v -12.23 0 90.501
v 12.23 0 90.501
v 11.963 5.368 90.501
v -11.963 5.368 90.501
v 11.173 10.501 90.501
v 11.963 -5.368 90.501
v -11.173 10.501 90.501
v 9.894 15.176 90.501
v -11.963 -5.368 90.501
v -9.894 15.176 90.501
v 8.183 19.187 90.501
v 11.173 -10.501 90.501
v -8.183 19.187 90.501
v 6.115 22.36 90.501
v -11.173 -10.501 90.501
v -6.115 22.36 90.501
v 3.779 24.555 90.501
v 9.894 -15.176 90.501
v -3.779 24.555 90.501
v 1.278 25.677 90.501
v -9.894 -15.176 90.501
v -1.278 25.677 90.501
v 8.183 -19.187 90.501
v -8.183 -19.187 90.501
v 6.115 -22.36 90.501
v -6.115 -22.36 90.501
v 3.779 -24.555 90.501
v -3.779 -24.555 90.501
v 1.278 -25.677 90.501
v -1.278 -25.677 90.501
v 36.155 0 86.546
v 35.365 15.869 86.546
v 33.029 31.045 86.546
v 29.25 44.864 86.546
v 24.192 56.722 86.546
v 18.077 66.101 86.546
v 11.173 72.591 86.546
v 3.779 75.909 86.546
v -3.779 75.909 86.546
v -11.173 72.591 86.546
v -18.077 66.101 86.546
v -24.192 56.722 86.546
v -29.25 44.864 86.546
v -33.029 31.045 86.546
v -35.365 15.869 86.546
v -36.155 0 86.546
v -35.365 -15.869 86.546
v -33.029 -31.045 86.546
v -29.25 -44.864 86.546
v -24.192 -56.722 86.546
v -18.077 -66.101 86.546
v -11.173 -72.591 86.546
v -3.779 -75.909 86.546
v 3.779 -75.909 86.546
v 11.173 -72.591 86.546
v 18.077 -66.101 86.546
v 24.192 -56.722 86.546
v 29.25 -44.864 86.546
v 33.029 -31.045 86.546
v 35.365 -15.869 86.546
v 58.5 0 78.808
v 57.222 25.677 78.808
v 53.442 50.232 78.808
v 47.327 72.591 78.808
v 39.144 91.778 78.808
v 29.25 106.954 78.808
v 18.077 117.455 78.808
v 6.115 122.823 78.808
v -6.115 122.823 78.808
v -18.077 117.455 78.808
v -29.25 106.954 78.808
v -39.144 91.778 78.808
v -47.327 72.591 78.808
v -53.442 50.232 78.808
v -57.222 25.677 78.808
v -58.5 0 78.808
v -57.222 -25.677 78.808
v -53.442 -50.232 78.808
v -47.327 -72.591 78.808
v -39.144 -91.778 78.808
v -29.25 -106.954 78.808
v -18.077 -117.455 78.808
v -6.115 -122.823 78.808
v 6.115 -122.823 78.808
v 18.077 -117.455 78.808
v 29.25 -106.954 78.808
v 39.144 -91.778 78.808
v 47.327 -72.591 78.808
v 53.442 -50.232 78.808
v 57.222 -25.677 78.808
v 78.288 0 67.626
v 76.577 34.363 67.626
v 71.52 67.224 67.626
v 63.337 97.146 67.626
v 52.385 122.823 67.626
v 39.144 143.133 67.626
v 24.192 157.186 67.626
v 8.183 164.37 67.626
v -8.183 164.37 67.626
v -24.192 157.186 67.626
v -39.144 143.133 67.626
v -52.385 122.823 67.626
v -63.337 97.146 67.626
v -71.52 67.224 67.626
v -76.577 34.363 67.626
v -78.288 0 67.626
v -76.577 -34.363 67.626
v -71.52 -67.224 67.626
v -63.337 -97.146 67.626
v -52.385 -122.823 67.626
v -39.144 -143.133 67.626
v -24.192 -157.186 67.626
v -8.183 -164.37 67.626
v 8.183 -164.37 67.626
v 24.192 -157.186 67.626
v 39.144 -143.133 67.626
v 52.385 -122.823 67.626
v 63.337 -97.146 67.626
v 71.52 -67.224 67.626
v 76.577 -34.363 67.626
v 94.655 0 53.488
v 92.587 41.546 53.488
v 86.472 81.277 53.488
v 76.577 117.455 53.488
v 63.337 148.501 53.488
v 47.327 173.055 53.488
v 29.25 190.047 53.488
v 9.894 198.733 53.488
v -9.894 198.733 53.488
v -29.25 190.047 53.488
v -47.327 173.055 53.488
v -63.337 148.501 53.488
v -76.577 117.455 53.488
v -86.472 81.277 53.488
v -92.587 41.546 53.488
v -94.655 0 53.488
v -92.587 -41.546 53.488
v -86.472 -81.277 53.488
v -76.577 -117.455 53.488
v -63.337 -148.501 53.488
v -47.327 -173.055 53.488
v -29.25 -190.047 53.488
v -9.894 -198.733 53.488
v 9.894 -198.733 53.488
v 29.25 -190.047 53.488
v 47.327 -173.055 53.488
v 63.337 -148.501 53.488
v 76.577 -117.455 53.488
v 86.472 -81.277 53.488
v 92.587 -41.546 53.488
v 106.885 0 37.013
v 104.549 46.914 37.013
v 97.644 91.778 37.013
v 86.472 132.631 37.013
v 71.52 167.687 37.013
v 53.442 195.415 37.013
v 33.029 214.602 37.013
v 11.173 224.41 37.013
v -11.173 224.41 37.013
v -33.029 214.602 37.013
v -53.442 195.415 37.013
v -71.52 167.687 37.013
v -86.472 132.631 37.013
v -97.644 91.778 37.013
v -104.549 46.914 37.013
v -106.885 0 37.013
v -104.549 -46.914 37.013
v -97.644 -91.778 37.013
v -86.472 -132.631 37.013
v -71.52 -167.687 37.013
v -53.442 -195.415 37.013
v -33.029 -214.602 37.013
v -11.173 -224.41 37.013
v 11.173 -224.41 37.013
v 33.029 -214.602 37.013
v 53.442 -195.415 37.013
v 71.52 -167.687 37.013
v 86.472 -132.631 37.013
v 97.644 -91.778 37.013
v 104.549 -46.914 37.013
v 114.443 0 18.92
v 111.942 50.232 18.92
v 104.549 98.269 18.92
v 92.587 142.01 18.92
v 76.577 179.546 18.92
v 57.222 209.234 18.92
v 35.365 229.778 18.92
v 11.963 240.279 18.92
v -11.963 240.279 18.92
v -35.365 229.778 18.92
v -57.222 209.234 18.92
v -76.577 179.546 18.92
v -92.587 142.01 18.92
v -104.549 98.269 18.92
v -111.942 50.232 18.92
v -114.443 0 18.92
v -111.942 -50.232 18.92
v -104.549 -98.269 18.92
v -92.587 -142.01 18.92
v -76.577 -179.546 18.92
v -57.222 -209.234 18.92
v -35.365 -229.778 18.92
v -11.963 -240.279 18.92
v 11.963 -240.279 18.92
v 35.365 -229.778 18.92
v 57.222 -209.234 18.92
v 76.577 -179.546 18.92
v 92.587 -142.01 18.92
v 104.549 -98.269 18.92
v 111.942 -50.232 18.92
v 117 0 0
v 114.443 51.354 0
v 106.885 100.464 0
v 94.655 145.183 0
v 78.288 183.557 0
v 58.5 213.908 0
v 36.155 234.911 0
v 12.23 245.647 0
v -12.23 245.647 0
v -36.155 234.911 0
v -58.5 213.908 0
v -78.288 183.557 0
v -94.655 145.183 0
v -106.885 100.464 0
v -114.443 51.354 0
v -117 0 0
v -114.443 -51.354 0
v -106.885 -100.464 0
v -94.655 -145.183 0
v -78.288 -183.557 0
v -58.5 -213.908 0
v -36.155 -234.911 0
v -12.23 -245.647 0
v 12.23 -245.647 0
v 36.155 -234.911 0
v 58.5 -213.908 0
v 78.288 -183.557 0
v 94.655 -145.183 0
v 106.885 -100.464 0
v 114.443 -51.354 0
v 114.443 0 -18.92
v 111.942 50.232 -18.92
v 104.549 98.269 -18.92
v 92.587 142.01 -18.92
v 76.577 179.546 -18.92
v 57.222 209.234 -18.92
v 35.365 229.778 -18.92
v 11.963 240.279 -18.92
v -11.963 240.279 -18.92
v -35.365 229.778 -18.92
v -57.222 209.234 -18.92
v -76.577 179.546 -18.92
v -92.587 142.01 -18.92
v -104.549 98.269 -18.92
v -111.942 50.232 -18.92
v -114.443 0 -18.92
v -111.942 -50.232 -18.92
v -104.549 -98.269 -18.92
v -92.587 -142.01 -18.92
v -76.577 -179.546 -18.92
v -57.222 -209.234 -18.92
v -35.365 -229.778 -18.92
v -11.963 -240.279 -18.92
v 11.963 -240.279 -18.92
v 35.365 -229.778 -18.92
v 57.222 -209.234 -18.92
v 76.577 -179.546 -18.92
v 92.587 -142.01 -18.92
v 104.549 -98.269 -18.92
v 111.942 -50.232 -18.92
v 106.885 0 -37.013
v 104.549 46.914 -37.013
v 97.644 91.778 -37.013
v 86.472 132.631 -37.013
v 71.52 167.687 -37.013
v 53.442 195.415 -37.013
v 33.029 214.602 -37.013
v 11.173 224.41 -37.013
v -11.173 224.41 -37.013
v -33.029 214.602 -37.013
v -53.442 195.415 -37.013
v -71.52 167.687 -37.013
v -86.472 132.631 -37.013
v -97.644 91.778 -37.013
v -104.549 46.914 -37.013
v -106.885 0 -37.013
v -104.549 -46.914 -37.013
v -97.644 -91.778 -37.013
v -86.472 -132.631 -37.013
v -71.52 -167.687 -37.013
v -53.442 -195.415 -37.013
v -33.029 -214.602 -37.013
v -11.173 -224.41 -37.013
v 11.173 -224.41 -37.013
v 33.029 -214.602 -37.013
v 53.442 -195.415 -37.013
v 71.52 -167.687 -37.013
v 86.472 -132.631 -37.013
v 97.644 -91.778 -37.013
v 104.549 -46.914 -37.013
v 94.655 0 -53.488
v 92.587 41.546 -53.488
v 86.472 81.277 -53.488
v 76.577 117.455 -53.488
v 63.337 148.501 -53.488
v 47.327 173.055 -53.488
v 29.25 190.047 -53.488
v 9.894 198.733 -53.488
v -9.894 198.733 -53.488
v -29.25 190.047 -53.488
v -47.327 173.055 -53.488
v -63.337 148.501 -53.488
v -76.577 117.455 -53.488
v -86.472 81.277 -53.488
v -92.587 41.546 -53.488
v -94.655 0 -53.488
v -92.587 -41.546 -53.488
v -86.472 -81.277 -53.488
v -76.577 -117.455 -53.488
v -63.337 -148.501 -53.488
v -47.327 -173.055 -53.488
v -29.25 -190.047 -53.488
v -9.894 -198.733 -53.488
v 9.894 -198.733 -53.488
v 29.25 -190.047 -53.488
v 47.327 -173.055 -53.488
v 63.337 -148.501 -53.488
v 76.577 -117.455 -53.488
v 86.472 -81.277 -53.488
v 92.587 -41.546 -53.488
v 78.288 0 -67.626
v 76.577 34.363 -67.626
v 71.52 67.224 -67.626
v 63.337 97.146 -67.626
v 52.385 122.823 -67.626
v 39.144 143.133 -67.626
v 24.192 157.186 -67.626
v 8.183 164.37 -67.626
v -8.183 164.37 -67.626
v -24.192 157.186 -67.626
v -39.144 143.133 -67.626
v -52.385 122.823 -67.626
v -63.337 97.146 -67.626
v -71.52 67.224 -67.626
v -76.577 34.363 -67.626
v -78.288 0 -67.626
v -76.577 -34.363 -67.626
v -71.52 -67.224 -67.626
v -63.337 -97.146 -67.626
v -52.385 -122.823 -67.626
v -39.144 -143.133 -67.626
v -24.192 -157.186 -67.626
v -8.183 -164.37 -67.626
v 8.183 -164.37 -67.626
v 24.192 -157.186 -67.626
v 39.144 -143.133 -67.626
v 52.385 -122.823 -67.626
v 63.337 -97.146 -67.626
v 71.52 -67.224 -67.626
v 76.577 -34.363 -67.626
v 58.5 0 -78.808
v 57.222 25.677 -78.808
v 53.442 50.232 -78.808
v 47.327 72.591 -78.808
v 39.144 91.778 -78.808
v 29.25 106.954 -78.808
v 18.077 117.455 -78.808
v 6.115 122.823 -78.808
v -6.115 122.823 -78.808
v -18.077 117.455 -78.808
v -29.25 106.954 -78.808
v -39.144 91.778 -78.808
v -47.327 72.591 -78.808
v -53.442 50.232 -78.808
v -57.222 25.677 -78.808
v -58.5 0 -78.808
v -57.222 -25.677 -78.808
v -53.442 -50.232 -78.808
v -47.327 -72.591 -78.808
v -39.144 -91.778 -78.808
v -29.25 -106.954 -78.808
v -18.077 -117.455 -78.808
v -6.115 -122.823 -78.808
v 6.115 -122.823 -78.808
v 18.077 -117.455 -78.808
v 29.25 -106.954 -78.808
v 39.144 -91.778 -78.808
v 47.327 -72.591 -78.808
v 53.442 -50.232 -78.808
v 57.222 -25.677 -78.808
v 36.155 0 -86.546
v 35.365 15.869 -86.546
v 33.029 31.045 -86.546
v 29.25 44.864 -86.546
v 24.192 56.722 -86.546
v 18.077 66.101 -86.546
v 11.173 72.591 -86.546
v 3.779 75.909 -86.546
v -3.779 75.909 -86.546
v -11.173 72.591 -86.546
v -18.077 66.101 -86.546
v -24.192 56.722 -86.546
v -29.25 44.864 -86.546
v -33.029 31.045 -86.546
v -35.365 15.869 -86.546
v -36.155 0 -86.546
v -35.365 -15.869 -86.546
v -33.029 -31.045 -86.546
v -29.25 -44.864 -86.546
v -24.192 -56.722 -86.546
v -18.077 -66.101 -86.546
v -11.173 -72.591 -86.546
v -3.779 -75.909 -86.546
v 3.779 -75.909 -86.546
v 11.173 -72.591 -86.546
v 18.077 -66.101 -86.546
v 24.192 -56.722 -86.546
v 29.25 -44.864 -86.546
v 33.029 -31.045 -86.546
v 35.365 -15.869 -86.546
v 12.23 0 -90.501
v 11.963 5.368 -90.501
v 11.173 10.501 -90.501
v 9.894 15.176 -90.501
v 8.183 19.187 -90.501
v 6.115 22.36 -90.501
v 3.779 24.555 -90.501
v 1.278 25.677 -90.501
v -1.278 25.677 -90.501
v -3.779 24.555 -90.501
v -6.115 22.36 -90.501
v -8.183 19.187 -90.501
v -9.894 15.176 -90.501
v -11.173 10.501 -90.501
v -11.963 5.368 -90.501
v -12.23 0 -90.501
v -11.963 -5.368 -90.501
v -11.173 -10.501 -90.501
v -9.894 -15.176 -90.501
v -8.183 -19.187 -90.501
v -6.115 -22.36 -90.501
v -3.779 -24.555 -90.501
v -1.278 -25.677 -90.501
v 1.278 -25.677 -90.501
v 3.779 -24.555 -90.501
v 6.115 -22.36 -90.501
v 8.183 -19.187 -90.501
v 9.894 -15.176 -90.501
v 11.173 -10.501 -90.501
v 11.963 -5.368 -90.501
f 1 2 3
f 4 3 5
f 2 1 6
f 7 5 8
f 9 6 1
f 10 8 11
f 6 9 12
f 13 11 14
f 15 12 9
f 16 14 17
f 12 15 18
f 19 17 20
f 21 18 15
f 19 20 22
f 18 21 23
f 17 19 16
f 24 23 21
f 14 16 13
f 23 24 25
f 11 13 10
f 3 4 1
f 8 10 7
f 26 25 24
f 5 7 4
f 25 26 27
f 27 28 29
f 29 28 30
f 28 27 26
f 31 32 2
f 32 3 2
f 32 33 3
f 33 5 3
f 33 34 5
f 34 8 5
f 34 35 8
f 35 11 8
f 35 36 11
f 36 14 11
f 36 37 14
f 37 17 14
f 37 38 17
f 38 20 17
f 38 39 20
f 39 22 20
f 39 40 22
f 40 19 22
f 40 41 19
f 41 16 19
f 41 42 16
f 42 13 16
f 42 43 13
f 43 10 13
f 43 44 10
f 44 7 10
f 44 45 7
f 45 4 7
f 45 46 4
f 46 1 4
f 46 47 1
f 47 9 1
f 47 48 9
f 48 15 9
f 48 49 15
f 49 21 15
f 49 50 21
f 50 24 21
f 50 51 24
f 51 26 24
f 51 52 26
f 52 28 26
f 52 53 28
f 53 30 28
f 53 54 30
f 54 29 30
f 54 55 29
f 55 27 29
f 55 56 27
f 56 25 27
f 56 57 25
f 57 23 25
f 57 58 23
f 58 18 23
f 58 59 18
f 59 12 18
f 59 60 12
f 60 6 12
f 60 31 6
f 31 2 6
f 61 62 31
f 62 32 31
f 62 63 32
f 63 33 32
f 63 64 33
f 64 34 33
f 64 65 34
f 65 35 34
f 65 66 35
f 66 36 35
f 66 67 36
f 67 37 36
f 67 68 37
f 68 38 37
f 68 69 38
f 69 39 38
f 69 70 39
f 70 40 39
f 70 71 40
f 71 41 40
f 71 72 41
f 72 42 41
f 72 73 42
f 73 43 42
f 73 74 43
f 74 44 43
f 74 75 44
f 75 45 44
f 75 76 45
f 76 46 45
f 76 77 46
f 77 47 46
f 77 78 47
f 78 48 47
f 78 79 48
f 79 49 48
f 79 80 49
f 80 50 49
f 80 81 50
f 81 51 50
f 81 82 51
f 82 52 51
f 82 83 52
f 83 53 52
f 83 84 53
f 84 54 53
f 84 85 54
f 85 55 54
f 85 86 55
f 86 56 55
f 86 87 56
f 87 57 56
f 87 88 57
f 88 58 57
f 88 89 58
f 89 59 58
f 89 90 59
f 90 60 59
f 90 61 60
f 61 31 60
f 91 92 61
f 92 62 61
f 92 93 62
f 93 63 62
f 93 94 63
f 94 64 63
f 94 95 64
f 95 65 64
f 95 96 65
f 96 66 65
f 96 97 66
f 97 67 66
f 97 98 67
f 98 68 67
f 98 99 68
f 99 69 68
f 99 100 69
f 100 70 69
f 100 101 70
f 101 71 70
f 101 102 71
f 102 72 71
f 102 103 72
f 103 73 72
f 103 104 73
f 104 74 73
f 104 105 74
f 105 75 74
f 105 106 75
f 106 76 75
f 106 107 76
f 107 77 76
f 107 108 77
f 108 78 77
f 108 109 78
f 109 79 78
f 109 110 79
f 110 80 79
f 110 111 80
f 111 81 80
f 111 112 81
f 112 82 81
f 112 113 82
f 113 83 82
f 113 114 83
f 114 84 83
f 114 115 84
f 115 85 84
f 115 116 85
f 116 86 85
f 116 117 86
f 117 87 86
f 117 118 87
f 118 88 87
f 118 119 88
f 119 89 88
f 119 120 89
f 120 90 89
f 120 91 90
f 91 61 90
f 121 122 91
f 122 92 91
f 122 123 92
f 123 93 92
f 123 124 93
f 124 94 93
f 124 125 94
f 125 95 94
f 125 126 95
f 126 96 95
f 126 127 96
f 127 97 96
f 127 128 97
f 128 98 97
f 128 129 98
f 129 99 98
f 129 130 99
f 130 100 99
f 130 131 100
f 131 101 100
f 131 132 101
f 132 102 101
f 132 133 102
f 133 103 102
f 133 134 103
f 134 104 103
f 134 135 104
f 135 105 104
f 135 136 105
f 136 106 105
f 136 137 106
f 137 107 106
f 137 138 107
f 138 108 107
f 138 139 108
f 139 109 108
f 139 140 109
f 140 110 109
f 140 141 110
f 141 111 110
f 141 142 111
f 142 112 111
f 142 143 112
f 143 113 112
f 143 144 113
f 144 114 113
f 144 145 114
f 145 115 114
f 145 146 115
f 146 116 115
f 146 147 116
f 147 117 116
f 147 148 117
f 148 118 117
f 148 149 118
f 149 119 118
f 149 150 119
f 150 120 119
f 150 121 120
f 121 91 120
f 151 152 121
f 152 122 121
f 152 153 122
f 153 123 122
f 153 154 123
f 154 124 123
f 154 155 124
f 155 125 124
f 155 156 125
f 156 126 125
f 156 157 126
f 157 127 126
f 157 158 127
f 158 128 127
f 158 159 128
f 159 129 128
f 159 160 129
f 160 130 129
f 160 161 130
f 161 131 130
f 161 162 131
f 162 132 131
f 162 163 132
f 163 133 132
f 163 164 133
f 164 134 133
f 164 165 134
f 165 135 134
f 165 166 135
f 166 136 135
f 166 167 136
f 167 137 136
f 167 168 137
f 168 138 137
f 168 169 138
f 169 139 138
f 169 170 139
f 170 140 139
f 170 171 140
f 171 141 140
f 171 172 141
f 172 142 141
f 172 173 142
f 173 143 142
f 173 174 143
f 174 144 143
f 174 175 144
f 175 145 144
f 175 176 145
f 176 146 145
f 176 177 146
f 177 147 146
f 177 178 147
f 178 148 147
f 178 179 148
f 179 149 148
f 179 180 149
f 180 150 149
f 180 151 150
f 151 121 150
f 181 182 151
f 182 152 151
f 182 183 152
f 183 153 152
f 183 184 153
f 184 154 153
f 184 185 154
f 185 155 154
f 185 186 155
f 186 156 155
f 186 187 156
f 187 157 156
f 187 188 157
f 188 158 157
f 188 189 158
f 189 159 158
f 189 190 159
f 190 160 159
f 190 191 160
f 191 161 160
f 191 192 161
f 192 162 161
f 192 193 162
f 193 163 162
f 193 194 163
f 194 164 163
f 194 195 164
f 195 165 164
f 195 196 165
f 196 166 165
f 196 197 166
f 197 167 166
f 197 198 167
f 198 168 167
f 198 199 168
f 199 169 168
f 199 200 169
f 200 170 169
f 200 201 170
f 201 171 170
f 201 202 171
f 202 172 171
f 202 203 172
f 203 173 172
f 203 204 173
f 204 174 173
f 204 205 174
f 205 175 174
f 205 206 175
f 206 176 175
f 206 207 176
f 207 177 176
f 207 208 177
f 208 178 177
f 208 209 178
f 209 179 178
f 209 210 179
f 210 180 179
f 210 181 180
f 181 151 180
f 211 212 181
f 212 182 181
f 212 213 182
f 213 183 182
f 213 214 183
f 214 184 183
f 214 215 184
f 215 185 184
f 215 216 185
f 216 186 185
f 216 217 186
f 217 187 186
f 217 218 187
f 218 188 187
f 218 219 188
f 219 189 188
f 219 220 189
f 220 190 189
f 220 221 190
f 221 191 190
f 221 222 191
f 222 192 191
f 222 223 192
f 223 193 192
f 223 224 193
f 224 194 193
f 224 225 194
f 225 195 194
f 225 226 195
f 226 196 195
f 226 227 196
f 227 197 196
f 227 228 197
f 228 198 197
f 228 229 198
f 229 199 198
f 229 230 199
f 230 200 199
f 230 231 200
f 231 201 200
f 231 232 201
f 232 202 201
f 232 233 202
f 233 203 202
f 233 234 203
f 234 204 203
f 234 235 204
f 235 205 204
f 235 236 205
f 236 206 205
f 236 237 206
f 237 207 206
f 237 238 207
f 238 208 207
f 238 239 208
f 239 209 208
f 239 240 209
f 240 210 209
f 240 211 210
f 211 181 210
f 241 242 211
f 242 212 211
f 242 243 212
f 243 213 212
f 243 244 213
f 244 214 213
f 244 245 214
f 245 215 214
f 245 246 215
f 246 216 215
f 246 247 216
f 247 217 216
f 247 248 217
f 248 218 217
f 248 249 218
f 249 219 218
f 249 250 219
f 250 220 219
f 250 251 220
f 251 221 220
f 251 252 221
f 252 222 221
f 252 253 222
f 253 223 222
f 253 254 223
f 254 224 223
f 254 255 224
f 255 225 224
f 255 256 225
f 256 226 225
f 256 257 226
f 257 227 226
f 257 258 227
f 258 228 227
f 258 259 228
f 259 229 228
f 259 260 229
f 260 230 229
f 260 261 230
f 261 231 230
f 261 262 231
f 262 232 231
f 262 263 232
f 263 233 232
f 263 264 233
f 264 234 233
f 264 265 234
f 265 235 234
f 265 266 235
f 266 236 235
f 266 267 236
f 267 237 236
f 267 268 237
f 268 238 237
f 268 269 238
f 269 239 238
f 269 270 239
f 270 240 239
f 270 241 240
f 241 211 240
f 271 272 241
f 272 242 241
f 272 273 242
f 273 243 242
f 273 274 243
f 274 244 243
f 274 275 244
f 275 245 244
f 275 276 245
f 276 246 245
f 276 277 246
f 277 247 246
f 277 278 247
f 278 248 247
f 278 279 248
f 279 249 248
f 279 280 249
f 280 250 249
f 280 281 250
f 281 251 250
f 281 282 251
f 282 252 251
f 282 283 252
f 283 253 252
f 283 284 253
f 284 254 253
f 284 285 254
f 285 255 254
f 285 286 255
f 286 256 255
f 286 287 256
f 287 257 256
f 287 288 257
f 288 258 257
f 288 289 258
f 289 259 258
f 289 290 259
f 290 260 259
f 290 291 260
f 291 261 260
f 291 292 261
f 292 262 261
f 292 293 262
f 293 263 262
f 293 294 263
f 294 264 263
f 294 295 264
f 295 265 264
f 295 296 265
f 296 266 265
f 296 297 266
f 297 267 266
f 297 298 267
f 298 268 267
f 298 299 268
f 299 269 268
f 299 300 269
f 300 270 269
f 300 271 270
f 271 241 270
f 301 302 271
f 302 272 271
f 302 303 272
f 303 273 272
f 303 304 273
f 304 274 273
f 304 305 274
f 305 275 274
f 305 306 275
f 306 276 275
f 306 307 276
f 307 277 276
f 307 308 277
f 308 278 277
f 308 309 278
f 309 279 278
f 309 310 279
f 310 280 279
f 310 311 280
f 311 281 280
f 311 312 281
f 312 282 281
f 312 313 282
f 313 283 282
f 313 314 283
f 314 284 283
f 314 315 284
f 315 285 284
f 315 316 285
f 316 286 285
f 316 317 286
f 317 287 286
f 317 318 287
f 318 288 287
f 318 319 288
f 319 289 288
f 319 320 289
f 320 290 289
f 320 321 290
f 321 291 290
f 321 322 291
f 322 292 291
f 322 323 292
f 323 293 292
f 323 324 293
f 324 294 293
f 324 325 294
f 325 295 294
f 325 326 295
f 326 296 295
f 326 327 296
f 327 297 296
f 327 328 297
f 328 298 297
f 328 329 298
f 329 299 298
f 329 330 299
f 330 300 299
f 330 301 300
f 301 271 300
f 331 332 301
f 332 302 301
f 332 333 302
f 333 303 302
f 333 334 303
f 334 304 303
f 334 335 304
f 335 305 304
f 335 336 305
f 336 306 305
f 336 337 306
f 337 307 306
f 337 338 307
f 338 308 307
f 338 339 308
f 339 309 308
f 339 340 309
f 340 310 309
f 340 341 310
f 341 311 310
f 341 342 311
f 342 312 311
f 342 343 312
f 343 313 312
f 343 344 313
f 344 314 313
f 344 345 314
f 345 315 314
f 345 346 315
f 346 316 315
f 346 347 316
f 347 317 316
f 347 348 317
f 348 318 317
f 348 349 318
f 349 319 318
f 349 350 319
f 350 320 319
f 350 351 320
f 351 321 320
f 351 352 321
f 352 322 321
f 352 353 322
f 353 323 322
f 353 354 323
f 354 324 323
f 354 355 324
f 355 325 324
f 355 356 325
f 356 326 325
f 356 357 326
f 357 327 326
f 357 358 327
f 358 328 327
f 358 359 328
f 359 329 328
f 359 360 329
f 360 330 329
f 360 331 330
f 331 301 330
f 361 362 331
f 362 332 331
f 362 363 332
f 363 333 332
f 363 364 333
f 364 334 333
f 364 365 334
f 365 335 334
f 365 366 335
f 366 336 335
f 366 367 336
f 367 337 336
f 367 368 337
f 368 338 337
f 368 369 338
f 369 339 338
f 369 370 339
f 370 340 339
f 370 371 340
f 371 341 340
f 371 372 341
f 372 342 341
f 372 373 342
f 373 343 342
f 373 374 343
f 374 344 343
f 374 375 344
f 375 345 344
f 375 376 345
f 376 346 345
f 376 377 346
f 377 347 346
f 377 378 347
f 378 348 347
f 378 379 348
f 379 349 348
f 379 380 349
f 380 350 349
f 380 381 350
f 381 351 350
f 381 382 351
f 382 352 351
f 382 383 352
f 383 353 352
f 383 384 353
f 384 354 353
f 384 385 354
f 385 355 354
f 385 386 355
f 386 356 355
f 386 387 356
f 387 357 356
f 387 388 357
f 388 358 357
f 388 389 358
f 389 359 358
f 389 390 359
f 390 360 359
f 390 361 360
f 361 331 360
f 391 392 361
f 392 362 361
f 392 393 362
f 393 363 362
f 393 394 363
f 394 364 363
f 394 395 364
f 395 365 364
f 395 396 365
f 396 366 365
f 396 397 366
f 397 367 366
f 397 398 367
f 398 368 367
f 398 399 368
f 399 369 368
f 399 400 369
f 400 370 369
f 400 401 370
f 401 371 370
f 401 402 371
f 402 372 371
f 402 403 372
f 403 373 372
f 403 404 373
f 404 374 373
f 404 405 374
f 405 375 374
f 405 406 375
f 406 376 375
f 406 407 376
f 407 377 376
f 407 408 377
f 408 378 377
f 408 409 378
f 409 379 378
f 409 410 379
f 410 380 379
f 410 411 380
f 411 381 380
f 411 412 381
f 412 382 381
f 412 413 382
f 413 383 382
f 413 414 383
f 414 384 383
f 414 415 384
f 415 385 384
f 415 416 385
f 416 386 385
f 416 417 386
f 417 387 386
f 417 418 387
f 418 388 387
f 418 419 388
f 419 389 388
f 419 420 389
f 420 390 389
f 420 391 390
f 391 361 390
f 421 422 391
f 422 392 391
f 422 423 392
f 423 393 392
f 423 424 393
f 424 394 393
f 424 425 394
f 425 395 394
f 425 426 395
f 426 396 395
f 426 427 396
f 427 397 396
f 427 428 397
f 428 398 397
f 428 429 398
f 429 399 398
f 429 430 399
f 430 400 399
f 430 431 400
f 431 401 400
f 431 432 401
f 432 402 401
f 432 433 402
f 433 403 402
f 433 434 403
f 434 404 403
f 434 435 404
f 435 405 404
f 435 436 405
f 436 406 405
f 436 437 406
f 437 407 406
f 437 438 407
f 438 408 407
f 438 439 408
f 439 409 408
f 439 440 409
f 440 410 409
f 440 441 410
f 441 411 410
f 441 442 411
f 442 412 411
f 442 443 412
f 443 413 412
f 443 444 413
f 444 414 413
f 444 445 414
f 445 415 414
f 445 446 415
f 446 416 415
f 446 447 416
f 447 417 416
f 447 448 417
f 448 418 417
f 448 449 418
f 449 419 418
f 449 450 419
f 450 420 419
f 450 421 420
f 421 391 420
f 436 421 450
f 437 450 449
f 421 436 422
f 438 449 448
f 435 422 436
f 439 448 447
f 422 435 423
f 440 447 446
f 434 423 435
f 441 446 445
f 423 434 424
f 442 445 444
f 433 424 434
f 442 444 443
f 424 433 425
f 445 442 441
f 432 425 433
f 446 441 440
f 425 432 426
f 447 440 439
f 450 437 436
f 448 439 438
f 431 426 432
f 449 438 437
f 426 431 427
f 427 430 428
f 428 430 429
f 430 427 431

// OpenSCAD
// Generated by SolidPython 1.0.1 on 2020-07-29 00:46:49


scale(v = [9, 19, 7]) {
	sphere(r = 13);
}
/***********************************************
*********      SolidPython code:      **********
************************************************
 
# import packages: SolidPython
from solid import *
from solid.utils import *
from itertools import chain, combinations, permutations


class Resize:

    def __init__(self, scad_file):
        self.scad_file = scad_file
        #self.scad_file = import_scad(scad_file)
        # cone/cylinder param:
        self.r1 = 0
        self.r2 = 0
        self.h = 0
        # rectangular prism param:
        self.w = 0
        self.l = 0
        # ellipse param:
        self.r = 0

    # import OpenScad code (file name corresponds to shape)


    # classify shape + parameters
    def assign(self, param1, param2, param3):
        if self.scad_file == 'cone.scad':
            self.r1 = param1
            self.r2 = param2
            self.h = param3
        elif self.scad_file == 'cylinder.scad':
            self.r1 = param1
            self.r2 = param2
            self.h = param3
        elif self.scad_file == 'rectangularPrism.scad':
            self.h = param1
            self.l = param2
            self.w = param3
        else:
            self.r = param1
            self.h = param2

    # resize parameters
    def iterate(self):
        x = range(3, 20, 2)
        i = 1
        if self.scad_file == 'cone.scad':
            tempList = list(permutations(x, 2))
            for temp in tempList:
                param1 = temp[0]
                param2 = temp[1]
                filepath = 'produced_scad_files/' + 'cone' + str(param1) + '_' + str(param2) + '_' + '.scad'
                scad_render_to_file(cylinder(h=param1, r1=param2, r2=0), filepath)

        elif self.scad_file == 'cylinder.scad':
            tempList = list(permutations(x, 3))
            for temp in tempList:
                param1 = temp[0]
                param2 = temp[1]
                filepath = 'produced_scad_files/' + 'cylinder' + str(param1) + '_' + str(param2) + '_' + '.scad'
                scad_render_to_file(cylinder(h=param1, r1=param2, r2=param2), filepath)

        elif self.scad_file == 'rectangularPrism.scad':
            tempList = list(permutations(x, 3))
            for temp in tempList:
                param1 = temp[0]
                param2 = temp[1]
                param3 = temp[2]
                filepath = 'produced_scad_files/' + 'rectangularPrism' + str(param1) + '_' + str(param2) + '_' + str(
                    param3) + '.scad'
                scad_render_to_file(cube(size=(param1, param2, param3)), filepath)

        elif self.scad_file == 'ellipse.scad':
            tempList = list(permutations(x, 4))
            for temp in tempList:
                param1 = temp[0]
                param2 = temp[1]
                param3 = temp[2]
                param4 = temp[3]
                filepath = 'produced_scad_files/' + 'ellipse' + str(param1) + '_' + str(param2) + '_' + str(param3) + '_' + str(param4) + '.scad'
                scad_render_to_file(scale([param1, param2, param3])(sphere(r=param4)), filepath)

    def render_to_scadfile(self):
        scad_render_to_file(scad, 'example.scad') 
 
************************************************/
